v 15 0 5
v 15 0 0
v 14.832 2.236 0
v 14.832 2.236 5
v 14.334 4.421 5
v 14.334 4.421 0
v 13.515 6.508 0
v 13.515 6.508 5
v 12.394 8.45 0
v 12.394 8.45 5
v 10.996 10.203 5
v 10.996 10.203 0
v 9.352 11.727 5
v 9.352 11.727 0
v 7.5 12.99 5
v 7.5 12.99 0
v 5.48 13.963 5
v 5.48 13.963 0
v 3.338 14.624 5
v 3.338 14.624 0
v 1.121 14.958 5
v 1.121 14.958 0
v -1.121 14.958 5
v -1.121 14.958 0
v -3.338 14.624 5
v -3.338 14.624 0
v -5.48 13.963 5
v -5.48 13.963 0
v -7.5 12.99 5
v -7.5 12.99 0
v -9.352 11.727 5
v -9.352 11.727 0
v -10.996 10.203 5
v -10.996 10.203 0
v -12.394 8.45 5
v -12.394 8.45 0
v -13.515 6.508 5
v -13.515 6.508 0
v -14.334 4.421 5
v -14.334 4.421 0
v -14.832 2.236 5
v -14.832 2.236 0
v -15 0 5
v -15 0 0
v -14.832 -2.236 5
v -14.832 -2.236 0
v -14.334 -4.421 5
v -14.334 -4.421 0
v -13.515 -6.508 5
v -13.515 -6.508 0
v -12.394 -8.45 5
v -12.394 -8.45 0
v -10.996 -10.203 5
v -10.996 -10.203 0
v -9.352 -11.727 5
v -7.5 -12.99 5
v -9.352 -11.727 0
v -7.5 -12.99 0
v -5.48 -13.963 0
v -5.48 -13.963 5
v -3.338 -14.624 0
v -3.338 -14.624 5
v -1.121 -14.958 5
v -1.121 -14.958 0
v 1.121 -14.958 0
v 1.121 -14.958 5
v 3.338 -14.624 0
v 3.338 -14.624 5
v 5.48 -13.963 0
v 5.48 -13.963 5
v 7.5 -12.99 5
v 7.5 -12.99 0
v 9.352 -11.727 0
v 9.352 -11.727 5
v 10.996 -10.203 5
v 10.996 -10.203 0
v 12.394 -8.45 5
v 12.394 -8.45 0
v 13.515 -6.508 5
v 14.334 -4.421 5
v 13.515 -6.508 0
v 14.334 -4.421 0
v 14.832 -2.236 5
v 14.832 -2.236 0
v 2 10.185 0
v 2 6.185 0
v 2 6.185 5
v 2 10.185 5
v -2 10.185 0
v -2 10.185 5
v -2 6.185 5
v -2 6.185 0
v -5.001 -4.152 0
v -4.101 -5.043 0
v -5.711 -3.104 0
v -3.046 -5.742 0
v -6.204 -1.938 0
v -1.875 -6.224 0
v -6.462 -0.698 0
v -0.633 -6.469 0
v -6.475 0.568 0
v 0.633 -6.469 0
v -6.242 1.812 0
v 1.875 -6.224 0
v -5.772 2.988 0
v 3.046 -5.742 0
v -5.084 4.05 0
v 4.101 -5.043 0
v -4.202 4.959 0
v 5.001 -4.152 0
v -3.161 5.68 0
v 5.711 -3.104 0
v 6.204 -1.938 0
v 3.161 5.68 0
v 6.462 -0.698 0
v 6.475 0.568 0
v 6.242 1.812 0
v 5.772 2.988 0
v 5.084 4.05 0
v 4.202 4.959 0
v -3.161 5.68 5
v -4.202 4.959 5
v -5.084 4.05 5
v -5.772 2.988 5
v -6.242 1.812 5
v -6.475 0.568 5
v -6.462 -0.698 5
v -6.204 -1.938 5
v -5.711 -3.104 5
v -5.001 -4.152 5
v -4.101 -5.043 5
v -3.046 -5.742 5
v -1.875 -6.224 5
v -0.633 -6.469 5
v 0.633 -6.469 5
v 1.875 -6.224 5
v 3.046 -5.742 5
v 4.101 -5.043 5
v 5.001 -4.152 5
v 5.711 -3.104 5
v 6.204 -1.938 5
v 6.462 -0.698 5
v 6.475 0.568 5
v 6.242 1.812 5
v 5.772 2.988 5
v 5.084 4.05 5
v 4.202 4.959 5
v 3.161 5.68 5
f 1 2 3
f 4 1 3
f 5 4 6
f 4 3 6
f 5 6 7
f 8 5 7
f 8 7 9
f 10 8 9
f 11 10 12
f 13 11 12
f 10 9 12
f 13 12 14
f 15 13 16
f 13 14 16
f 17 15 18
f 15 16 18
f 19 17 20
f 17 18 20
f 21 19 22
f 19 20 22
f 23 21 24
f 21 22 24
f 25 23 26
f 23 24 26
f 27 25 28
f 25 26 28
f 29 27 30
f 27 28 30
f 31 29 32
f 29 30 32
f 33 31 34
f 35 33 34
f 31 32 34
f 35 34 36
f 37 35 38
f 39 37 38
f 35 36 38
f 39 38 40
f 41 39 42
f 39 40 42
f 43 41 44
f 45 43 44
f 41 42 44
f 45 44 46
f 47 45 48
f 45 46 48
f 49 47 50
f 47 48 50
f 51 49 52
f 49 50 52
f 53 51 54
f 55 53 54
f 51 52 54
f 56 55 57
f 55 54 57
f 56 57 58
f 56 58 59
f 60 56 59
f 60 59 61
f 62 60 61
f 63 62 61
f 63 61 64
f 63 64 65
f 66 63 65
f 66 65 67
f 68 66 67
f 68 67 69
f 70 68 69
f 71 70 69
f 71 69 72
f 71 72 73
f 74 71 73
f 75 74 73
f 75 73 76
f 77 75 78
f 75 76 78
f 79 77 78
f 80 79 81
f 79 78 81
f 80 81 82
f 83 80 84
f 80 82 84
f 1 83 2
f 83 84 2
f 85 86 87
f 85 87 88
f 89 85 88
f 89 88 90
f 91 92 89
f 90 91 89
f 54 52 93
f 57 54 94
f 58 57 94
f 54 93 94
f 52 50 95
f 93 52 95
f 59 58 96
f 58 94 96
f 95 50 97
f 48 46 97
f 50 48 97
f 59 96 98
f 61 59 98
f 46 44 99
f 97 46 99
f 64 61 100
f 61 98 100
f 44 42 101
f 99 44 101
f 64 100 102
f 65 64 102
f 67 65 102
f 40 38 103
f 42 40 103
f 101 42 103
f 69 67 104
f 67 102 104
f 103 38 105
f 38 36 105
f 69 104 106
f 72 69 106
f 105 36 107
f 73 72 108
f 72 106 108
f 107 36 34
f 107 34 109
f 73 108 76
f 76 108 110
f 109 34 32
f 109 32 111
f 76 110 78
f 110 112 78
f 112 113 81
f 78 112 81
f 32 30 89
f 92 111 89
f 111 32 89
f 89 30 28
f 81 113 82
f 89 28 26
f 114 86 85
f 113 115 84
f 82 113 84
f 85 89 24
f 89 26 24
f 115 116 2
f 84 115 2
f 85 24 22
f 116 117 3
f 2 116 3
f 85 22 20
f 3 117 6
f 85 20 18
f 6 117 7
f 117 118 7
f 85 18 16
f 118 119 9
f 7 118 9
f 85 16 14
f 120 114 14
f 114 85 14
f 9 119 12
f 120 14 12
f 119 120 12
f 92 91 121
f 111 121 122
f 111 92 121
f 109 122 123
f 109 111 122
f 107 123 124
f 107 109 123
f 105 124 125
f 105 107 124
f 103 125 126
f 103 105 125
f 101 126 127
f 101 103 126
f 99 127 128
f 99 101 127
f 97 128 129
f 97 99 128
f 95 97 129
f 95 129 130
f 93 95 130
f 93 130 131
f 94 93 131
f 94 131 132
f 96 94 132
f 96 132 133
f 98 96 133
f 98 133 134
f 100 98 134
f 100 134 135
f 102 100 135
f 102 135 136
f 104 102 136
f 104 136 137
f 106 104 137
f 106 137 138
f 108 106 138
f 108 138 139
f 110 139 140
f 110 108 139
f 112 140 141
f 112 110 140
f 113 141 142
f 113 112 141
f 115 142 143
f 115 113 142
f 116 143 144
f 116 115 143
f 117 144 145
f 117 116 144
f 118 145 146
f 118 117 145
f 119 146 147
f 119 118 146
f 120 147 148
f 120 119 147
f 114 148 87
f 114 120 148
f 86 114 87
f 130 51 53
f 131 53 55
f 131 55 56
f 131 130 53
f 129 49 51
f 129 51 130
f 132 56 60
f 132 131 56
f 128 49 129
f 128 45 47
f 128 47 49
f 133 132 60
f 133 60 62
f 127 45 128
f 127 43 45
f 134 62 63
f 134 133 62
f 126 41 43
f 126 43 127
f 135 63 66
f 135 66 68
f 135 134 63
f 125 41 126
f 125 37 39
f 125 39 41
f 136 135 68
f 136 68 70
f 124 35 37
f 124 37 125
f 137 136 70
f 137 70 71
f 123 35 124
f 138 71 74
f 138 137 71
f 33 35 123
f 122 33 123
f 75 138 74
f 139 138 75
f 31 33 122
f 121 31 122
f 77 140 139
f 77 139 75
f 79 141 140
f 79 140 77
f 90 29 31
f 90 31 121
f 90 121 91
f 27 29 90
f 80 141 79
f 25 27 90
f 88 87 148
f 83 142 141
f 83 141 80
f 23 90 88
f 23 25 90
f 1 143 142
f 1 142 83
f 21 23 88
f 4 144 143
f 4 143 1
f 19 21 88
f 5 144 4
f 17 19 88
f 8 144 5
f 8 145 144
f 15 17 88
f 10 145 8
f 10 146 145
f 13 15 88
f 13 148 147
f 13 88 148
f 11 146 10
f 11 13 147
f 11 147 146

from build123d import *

# Parameters (mm, degrees)
IZIM1_R                     = 15
IZIM1_R_2                   = 6.5
Y_KSEKLIK_EKSTR_ZYON1_DEPTH = 5
IZIM2_W                     = 4
IZIM2_H                     = 4
KES_EKSTR_ZYON1_DEPTH       = 8


with BuildPart() as part:
    # Çizim1 → Yükseklik-Ekstrüzyon1 (new body)
    with BuildSketch(Plane.XY):
        Circle(IZIM1_R)
        Circle(IZIM1_R_2, mode=Mode.SUBTRACT)
    extrude(amount=Y_KSEKLIK_EKSTR_ZYON1_DEPTH)

    # Çizim2 → Kes-Ekstrüzyon1 (cut)
    with BuildSketch(Plane(origin=(0, 0, 0), x_dir=(-1, 0, 0), z_dir=(0, 0, -1))):
        with Locations((0, 8.184658438)):
            Rectangle(IZIM2_W, IZIM2_H)
    extrude(amount=-KES_EKSTR_ZYON1_DEPTH, mode=Mode.SUBTRACT)


solid = part.part
